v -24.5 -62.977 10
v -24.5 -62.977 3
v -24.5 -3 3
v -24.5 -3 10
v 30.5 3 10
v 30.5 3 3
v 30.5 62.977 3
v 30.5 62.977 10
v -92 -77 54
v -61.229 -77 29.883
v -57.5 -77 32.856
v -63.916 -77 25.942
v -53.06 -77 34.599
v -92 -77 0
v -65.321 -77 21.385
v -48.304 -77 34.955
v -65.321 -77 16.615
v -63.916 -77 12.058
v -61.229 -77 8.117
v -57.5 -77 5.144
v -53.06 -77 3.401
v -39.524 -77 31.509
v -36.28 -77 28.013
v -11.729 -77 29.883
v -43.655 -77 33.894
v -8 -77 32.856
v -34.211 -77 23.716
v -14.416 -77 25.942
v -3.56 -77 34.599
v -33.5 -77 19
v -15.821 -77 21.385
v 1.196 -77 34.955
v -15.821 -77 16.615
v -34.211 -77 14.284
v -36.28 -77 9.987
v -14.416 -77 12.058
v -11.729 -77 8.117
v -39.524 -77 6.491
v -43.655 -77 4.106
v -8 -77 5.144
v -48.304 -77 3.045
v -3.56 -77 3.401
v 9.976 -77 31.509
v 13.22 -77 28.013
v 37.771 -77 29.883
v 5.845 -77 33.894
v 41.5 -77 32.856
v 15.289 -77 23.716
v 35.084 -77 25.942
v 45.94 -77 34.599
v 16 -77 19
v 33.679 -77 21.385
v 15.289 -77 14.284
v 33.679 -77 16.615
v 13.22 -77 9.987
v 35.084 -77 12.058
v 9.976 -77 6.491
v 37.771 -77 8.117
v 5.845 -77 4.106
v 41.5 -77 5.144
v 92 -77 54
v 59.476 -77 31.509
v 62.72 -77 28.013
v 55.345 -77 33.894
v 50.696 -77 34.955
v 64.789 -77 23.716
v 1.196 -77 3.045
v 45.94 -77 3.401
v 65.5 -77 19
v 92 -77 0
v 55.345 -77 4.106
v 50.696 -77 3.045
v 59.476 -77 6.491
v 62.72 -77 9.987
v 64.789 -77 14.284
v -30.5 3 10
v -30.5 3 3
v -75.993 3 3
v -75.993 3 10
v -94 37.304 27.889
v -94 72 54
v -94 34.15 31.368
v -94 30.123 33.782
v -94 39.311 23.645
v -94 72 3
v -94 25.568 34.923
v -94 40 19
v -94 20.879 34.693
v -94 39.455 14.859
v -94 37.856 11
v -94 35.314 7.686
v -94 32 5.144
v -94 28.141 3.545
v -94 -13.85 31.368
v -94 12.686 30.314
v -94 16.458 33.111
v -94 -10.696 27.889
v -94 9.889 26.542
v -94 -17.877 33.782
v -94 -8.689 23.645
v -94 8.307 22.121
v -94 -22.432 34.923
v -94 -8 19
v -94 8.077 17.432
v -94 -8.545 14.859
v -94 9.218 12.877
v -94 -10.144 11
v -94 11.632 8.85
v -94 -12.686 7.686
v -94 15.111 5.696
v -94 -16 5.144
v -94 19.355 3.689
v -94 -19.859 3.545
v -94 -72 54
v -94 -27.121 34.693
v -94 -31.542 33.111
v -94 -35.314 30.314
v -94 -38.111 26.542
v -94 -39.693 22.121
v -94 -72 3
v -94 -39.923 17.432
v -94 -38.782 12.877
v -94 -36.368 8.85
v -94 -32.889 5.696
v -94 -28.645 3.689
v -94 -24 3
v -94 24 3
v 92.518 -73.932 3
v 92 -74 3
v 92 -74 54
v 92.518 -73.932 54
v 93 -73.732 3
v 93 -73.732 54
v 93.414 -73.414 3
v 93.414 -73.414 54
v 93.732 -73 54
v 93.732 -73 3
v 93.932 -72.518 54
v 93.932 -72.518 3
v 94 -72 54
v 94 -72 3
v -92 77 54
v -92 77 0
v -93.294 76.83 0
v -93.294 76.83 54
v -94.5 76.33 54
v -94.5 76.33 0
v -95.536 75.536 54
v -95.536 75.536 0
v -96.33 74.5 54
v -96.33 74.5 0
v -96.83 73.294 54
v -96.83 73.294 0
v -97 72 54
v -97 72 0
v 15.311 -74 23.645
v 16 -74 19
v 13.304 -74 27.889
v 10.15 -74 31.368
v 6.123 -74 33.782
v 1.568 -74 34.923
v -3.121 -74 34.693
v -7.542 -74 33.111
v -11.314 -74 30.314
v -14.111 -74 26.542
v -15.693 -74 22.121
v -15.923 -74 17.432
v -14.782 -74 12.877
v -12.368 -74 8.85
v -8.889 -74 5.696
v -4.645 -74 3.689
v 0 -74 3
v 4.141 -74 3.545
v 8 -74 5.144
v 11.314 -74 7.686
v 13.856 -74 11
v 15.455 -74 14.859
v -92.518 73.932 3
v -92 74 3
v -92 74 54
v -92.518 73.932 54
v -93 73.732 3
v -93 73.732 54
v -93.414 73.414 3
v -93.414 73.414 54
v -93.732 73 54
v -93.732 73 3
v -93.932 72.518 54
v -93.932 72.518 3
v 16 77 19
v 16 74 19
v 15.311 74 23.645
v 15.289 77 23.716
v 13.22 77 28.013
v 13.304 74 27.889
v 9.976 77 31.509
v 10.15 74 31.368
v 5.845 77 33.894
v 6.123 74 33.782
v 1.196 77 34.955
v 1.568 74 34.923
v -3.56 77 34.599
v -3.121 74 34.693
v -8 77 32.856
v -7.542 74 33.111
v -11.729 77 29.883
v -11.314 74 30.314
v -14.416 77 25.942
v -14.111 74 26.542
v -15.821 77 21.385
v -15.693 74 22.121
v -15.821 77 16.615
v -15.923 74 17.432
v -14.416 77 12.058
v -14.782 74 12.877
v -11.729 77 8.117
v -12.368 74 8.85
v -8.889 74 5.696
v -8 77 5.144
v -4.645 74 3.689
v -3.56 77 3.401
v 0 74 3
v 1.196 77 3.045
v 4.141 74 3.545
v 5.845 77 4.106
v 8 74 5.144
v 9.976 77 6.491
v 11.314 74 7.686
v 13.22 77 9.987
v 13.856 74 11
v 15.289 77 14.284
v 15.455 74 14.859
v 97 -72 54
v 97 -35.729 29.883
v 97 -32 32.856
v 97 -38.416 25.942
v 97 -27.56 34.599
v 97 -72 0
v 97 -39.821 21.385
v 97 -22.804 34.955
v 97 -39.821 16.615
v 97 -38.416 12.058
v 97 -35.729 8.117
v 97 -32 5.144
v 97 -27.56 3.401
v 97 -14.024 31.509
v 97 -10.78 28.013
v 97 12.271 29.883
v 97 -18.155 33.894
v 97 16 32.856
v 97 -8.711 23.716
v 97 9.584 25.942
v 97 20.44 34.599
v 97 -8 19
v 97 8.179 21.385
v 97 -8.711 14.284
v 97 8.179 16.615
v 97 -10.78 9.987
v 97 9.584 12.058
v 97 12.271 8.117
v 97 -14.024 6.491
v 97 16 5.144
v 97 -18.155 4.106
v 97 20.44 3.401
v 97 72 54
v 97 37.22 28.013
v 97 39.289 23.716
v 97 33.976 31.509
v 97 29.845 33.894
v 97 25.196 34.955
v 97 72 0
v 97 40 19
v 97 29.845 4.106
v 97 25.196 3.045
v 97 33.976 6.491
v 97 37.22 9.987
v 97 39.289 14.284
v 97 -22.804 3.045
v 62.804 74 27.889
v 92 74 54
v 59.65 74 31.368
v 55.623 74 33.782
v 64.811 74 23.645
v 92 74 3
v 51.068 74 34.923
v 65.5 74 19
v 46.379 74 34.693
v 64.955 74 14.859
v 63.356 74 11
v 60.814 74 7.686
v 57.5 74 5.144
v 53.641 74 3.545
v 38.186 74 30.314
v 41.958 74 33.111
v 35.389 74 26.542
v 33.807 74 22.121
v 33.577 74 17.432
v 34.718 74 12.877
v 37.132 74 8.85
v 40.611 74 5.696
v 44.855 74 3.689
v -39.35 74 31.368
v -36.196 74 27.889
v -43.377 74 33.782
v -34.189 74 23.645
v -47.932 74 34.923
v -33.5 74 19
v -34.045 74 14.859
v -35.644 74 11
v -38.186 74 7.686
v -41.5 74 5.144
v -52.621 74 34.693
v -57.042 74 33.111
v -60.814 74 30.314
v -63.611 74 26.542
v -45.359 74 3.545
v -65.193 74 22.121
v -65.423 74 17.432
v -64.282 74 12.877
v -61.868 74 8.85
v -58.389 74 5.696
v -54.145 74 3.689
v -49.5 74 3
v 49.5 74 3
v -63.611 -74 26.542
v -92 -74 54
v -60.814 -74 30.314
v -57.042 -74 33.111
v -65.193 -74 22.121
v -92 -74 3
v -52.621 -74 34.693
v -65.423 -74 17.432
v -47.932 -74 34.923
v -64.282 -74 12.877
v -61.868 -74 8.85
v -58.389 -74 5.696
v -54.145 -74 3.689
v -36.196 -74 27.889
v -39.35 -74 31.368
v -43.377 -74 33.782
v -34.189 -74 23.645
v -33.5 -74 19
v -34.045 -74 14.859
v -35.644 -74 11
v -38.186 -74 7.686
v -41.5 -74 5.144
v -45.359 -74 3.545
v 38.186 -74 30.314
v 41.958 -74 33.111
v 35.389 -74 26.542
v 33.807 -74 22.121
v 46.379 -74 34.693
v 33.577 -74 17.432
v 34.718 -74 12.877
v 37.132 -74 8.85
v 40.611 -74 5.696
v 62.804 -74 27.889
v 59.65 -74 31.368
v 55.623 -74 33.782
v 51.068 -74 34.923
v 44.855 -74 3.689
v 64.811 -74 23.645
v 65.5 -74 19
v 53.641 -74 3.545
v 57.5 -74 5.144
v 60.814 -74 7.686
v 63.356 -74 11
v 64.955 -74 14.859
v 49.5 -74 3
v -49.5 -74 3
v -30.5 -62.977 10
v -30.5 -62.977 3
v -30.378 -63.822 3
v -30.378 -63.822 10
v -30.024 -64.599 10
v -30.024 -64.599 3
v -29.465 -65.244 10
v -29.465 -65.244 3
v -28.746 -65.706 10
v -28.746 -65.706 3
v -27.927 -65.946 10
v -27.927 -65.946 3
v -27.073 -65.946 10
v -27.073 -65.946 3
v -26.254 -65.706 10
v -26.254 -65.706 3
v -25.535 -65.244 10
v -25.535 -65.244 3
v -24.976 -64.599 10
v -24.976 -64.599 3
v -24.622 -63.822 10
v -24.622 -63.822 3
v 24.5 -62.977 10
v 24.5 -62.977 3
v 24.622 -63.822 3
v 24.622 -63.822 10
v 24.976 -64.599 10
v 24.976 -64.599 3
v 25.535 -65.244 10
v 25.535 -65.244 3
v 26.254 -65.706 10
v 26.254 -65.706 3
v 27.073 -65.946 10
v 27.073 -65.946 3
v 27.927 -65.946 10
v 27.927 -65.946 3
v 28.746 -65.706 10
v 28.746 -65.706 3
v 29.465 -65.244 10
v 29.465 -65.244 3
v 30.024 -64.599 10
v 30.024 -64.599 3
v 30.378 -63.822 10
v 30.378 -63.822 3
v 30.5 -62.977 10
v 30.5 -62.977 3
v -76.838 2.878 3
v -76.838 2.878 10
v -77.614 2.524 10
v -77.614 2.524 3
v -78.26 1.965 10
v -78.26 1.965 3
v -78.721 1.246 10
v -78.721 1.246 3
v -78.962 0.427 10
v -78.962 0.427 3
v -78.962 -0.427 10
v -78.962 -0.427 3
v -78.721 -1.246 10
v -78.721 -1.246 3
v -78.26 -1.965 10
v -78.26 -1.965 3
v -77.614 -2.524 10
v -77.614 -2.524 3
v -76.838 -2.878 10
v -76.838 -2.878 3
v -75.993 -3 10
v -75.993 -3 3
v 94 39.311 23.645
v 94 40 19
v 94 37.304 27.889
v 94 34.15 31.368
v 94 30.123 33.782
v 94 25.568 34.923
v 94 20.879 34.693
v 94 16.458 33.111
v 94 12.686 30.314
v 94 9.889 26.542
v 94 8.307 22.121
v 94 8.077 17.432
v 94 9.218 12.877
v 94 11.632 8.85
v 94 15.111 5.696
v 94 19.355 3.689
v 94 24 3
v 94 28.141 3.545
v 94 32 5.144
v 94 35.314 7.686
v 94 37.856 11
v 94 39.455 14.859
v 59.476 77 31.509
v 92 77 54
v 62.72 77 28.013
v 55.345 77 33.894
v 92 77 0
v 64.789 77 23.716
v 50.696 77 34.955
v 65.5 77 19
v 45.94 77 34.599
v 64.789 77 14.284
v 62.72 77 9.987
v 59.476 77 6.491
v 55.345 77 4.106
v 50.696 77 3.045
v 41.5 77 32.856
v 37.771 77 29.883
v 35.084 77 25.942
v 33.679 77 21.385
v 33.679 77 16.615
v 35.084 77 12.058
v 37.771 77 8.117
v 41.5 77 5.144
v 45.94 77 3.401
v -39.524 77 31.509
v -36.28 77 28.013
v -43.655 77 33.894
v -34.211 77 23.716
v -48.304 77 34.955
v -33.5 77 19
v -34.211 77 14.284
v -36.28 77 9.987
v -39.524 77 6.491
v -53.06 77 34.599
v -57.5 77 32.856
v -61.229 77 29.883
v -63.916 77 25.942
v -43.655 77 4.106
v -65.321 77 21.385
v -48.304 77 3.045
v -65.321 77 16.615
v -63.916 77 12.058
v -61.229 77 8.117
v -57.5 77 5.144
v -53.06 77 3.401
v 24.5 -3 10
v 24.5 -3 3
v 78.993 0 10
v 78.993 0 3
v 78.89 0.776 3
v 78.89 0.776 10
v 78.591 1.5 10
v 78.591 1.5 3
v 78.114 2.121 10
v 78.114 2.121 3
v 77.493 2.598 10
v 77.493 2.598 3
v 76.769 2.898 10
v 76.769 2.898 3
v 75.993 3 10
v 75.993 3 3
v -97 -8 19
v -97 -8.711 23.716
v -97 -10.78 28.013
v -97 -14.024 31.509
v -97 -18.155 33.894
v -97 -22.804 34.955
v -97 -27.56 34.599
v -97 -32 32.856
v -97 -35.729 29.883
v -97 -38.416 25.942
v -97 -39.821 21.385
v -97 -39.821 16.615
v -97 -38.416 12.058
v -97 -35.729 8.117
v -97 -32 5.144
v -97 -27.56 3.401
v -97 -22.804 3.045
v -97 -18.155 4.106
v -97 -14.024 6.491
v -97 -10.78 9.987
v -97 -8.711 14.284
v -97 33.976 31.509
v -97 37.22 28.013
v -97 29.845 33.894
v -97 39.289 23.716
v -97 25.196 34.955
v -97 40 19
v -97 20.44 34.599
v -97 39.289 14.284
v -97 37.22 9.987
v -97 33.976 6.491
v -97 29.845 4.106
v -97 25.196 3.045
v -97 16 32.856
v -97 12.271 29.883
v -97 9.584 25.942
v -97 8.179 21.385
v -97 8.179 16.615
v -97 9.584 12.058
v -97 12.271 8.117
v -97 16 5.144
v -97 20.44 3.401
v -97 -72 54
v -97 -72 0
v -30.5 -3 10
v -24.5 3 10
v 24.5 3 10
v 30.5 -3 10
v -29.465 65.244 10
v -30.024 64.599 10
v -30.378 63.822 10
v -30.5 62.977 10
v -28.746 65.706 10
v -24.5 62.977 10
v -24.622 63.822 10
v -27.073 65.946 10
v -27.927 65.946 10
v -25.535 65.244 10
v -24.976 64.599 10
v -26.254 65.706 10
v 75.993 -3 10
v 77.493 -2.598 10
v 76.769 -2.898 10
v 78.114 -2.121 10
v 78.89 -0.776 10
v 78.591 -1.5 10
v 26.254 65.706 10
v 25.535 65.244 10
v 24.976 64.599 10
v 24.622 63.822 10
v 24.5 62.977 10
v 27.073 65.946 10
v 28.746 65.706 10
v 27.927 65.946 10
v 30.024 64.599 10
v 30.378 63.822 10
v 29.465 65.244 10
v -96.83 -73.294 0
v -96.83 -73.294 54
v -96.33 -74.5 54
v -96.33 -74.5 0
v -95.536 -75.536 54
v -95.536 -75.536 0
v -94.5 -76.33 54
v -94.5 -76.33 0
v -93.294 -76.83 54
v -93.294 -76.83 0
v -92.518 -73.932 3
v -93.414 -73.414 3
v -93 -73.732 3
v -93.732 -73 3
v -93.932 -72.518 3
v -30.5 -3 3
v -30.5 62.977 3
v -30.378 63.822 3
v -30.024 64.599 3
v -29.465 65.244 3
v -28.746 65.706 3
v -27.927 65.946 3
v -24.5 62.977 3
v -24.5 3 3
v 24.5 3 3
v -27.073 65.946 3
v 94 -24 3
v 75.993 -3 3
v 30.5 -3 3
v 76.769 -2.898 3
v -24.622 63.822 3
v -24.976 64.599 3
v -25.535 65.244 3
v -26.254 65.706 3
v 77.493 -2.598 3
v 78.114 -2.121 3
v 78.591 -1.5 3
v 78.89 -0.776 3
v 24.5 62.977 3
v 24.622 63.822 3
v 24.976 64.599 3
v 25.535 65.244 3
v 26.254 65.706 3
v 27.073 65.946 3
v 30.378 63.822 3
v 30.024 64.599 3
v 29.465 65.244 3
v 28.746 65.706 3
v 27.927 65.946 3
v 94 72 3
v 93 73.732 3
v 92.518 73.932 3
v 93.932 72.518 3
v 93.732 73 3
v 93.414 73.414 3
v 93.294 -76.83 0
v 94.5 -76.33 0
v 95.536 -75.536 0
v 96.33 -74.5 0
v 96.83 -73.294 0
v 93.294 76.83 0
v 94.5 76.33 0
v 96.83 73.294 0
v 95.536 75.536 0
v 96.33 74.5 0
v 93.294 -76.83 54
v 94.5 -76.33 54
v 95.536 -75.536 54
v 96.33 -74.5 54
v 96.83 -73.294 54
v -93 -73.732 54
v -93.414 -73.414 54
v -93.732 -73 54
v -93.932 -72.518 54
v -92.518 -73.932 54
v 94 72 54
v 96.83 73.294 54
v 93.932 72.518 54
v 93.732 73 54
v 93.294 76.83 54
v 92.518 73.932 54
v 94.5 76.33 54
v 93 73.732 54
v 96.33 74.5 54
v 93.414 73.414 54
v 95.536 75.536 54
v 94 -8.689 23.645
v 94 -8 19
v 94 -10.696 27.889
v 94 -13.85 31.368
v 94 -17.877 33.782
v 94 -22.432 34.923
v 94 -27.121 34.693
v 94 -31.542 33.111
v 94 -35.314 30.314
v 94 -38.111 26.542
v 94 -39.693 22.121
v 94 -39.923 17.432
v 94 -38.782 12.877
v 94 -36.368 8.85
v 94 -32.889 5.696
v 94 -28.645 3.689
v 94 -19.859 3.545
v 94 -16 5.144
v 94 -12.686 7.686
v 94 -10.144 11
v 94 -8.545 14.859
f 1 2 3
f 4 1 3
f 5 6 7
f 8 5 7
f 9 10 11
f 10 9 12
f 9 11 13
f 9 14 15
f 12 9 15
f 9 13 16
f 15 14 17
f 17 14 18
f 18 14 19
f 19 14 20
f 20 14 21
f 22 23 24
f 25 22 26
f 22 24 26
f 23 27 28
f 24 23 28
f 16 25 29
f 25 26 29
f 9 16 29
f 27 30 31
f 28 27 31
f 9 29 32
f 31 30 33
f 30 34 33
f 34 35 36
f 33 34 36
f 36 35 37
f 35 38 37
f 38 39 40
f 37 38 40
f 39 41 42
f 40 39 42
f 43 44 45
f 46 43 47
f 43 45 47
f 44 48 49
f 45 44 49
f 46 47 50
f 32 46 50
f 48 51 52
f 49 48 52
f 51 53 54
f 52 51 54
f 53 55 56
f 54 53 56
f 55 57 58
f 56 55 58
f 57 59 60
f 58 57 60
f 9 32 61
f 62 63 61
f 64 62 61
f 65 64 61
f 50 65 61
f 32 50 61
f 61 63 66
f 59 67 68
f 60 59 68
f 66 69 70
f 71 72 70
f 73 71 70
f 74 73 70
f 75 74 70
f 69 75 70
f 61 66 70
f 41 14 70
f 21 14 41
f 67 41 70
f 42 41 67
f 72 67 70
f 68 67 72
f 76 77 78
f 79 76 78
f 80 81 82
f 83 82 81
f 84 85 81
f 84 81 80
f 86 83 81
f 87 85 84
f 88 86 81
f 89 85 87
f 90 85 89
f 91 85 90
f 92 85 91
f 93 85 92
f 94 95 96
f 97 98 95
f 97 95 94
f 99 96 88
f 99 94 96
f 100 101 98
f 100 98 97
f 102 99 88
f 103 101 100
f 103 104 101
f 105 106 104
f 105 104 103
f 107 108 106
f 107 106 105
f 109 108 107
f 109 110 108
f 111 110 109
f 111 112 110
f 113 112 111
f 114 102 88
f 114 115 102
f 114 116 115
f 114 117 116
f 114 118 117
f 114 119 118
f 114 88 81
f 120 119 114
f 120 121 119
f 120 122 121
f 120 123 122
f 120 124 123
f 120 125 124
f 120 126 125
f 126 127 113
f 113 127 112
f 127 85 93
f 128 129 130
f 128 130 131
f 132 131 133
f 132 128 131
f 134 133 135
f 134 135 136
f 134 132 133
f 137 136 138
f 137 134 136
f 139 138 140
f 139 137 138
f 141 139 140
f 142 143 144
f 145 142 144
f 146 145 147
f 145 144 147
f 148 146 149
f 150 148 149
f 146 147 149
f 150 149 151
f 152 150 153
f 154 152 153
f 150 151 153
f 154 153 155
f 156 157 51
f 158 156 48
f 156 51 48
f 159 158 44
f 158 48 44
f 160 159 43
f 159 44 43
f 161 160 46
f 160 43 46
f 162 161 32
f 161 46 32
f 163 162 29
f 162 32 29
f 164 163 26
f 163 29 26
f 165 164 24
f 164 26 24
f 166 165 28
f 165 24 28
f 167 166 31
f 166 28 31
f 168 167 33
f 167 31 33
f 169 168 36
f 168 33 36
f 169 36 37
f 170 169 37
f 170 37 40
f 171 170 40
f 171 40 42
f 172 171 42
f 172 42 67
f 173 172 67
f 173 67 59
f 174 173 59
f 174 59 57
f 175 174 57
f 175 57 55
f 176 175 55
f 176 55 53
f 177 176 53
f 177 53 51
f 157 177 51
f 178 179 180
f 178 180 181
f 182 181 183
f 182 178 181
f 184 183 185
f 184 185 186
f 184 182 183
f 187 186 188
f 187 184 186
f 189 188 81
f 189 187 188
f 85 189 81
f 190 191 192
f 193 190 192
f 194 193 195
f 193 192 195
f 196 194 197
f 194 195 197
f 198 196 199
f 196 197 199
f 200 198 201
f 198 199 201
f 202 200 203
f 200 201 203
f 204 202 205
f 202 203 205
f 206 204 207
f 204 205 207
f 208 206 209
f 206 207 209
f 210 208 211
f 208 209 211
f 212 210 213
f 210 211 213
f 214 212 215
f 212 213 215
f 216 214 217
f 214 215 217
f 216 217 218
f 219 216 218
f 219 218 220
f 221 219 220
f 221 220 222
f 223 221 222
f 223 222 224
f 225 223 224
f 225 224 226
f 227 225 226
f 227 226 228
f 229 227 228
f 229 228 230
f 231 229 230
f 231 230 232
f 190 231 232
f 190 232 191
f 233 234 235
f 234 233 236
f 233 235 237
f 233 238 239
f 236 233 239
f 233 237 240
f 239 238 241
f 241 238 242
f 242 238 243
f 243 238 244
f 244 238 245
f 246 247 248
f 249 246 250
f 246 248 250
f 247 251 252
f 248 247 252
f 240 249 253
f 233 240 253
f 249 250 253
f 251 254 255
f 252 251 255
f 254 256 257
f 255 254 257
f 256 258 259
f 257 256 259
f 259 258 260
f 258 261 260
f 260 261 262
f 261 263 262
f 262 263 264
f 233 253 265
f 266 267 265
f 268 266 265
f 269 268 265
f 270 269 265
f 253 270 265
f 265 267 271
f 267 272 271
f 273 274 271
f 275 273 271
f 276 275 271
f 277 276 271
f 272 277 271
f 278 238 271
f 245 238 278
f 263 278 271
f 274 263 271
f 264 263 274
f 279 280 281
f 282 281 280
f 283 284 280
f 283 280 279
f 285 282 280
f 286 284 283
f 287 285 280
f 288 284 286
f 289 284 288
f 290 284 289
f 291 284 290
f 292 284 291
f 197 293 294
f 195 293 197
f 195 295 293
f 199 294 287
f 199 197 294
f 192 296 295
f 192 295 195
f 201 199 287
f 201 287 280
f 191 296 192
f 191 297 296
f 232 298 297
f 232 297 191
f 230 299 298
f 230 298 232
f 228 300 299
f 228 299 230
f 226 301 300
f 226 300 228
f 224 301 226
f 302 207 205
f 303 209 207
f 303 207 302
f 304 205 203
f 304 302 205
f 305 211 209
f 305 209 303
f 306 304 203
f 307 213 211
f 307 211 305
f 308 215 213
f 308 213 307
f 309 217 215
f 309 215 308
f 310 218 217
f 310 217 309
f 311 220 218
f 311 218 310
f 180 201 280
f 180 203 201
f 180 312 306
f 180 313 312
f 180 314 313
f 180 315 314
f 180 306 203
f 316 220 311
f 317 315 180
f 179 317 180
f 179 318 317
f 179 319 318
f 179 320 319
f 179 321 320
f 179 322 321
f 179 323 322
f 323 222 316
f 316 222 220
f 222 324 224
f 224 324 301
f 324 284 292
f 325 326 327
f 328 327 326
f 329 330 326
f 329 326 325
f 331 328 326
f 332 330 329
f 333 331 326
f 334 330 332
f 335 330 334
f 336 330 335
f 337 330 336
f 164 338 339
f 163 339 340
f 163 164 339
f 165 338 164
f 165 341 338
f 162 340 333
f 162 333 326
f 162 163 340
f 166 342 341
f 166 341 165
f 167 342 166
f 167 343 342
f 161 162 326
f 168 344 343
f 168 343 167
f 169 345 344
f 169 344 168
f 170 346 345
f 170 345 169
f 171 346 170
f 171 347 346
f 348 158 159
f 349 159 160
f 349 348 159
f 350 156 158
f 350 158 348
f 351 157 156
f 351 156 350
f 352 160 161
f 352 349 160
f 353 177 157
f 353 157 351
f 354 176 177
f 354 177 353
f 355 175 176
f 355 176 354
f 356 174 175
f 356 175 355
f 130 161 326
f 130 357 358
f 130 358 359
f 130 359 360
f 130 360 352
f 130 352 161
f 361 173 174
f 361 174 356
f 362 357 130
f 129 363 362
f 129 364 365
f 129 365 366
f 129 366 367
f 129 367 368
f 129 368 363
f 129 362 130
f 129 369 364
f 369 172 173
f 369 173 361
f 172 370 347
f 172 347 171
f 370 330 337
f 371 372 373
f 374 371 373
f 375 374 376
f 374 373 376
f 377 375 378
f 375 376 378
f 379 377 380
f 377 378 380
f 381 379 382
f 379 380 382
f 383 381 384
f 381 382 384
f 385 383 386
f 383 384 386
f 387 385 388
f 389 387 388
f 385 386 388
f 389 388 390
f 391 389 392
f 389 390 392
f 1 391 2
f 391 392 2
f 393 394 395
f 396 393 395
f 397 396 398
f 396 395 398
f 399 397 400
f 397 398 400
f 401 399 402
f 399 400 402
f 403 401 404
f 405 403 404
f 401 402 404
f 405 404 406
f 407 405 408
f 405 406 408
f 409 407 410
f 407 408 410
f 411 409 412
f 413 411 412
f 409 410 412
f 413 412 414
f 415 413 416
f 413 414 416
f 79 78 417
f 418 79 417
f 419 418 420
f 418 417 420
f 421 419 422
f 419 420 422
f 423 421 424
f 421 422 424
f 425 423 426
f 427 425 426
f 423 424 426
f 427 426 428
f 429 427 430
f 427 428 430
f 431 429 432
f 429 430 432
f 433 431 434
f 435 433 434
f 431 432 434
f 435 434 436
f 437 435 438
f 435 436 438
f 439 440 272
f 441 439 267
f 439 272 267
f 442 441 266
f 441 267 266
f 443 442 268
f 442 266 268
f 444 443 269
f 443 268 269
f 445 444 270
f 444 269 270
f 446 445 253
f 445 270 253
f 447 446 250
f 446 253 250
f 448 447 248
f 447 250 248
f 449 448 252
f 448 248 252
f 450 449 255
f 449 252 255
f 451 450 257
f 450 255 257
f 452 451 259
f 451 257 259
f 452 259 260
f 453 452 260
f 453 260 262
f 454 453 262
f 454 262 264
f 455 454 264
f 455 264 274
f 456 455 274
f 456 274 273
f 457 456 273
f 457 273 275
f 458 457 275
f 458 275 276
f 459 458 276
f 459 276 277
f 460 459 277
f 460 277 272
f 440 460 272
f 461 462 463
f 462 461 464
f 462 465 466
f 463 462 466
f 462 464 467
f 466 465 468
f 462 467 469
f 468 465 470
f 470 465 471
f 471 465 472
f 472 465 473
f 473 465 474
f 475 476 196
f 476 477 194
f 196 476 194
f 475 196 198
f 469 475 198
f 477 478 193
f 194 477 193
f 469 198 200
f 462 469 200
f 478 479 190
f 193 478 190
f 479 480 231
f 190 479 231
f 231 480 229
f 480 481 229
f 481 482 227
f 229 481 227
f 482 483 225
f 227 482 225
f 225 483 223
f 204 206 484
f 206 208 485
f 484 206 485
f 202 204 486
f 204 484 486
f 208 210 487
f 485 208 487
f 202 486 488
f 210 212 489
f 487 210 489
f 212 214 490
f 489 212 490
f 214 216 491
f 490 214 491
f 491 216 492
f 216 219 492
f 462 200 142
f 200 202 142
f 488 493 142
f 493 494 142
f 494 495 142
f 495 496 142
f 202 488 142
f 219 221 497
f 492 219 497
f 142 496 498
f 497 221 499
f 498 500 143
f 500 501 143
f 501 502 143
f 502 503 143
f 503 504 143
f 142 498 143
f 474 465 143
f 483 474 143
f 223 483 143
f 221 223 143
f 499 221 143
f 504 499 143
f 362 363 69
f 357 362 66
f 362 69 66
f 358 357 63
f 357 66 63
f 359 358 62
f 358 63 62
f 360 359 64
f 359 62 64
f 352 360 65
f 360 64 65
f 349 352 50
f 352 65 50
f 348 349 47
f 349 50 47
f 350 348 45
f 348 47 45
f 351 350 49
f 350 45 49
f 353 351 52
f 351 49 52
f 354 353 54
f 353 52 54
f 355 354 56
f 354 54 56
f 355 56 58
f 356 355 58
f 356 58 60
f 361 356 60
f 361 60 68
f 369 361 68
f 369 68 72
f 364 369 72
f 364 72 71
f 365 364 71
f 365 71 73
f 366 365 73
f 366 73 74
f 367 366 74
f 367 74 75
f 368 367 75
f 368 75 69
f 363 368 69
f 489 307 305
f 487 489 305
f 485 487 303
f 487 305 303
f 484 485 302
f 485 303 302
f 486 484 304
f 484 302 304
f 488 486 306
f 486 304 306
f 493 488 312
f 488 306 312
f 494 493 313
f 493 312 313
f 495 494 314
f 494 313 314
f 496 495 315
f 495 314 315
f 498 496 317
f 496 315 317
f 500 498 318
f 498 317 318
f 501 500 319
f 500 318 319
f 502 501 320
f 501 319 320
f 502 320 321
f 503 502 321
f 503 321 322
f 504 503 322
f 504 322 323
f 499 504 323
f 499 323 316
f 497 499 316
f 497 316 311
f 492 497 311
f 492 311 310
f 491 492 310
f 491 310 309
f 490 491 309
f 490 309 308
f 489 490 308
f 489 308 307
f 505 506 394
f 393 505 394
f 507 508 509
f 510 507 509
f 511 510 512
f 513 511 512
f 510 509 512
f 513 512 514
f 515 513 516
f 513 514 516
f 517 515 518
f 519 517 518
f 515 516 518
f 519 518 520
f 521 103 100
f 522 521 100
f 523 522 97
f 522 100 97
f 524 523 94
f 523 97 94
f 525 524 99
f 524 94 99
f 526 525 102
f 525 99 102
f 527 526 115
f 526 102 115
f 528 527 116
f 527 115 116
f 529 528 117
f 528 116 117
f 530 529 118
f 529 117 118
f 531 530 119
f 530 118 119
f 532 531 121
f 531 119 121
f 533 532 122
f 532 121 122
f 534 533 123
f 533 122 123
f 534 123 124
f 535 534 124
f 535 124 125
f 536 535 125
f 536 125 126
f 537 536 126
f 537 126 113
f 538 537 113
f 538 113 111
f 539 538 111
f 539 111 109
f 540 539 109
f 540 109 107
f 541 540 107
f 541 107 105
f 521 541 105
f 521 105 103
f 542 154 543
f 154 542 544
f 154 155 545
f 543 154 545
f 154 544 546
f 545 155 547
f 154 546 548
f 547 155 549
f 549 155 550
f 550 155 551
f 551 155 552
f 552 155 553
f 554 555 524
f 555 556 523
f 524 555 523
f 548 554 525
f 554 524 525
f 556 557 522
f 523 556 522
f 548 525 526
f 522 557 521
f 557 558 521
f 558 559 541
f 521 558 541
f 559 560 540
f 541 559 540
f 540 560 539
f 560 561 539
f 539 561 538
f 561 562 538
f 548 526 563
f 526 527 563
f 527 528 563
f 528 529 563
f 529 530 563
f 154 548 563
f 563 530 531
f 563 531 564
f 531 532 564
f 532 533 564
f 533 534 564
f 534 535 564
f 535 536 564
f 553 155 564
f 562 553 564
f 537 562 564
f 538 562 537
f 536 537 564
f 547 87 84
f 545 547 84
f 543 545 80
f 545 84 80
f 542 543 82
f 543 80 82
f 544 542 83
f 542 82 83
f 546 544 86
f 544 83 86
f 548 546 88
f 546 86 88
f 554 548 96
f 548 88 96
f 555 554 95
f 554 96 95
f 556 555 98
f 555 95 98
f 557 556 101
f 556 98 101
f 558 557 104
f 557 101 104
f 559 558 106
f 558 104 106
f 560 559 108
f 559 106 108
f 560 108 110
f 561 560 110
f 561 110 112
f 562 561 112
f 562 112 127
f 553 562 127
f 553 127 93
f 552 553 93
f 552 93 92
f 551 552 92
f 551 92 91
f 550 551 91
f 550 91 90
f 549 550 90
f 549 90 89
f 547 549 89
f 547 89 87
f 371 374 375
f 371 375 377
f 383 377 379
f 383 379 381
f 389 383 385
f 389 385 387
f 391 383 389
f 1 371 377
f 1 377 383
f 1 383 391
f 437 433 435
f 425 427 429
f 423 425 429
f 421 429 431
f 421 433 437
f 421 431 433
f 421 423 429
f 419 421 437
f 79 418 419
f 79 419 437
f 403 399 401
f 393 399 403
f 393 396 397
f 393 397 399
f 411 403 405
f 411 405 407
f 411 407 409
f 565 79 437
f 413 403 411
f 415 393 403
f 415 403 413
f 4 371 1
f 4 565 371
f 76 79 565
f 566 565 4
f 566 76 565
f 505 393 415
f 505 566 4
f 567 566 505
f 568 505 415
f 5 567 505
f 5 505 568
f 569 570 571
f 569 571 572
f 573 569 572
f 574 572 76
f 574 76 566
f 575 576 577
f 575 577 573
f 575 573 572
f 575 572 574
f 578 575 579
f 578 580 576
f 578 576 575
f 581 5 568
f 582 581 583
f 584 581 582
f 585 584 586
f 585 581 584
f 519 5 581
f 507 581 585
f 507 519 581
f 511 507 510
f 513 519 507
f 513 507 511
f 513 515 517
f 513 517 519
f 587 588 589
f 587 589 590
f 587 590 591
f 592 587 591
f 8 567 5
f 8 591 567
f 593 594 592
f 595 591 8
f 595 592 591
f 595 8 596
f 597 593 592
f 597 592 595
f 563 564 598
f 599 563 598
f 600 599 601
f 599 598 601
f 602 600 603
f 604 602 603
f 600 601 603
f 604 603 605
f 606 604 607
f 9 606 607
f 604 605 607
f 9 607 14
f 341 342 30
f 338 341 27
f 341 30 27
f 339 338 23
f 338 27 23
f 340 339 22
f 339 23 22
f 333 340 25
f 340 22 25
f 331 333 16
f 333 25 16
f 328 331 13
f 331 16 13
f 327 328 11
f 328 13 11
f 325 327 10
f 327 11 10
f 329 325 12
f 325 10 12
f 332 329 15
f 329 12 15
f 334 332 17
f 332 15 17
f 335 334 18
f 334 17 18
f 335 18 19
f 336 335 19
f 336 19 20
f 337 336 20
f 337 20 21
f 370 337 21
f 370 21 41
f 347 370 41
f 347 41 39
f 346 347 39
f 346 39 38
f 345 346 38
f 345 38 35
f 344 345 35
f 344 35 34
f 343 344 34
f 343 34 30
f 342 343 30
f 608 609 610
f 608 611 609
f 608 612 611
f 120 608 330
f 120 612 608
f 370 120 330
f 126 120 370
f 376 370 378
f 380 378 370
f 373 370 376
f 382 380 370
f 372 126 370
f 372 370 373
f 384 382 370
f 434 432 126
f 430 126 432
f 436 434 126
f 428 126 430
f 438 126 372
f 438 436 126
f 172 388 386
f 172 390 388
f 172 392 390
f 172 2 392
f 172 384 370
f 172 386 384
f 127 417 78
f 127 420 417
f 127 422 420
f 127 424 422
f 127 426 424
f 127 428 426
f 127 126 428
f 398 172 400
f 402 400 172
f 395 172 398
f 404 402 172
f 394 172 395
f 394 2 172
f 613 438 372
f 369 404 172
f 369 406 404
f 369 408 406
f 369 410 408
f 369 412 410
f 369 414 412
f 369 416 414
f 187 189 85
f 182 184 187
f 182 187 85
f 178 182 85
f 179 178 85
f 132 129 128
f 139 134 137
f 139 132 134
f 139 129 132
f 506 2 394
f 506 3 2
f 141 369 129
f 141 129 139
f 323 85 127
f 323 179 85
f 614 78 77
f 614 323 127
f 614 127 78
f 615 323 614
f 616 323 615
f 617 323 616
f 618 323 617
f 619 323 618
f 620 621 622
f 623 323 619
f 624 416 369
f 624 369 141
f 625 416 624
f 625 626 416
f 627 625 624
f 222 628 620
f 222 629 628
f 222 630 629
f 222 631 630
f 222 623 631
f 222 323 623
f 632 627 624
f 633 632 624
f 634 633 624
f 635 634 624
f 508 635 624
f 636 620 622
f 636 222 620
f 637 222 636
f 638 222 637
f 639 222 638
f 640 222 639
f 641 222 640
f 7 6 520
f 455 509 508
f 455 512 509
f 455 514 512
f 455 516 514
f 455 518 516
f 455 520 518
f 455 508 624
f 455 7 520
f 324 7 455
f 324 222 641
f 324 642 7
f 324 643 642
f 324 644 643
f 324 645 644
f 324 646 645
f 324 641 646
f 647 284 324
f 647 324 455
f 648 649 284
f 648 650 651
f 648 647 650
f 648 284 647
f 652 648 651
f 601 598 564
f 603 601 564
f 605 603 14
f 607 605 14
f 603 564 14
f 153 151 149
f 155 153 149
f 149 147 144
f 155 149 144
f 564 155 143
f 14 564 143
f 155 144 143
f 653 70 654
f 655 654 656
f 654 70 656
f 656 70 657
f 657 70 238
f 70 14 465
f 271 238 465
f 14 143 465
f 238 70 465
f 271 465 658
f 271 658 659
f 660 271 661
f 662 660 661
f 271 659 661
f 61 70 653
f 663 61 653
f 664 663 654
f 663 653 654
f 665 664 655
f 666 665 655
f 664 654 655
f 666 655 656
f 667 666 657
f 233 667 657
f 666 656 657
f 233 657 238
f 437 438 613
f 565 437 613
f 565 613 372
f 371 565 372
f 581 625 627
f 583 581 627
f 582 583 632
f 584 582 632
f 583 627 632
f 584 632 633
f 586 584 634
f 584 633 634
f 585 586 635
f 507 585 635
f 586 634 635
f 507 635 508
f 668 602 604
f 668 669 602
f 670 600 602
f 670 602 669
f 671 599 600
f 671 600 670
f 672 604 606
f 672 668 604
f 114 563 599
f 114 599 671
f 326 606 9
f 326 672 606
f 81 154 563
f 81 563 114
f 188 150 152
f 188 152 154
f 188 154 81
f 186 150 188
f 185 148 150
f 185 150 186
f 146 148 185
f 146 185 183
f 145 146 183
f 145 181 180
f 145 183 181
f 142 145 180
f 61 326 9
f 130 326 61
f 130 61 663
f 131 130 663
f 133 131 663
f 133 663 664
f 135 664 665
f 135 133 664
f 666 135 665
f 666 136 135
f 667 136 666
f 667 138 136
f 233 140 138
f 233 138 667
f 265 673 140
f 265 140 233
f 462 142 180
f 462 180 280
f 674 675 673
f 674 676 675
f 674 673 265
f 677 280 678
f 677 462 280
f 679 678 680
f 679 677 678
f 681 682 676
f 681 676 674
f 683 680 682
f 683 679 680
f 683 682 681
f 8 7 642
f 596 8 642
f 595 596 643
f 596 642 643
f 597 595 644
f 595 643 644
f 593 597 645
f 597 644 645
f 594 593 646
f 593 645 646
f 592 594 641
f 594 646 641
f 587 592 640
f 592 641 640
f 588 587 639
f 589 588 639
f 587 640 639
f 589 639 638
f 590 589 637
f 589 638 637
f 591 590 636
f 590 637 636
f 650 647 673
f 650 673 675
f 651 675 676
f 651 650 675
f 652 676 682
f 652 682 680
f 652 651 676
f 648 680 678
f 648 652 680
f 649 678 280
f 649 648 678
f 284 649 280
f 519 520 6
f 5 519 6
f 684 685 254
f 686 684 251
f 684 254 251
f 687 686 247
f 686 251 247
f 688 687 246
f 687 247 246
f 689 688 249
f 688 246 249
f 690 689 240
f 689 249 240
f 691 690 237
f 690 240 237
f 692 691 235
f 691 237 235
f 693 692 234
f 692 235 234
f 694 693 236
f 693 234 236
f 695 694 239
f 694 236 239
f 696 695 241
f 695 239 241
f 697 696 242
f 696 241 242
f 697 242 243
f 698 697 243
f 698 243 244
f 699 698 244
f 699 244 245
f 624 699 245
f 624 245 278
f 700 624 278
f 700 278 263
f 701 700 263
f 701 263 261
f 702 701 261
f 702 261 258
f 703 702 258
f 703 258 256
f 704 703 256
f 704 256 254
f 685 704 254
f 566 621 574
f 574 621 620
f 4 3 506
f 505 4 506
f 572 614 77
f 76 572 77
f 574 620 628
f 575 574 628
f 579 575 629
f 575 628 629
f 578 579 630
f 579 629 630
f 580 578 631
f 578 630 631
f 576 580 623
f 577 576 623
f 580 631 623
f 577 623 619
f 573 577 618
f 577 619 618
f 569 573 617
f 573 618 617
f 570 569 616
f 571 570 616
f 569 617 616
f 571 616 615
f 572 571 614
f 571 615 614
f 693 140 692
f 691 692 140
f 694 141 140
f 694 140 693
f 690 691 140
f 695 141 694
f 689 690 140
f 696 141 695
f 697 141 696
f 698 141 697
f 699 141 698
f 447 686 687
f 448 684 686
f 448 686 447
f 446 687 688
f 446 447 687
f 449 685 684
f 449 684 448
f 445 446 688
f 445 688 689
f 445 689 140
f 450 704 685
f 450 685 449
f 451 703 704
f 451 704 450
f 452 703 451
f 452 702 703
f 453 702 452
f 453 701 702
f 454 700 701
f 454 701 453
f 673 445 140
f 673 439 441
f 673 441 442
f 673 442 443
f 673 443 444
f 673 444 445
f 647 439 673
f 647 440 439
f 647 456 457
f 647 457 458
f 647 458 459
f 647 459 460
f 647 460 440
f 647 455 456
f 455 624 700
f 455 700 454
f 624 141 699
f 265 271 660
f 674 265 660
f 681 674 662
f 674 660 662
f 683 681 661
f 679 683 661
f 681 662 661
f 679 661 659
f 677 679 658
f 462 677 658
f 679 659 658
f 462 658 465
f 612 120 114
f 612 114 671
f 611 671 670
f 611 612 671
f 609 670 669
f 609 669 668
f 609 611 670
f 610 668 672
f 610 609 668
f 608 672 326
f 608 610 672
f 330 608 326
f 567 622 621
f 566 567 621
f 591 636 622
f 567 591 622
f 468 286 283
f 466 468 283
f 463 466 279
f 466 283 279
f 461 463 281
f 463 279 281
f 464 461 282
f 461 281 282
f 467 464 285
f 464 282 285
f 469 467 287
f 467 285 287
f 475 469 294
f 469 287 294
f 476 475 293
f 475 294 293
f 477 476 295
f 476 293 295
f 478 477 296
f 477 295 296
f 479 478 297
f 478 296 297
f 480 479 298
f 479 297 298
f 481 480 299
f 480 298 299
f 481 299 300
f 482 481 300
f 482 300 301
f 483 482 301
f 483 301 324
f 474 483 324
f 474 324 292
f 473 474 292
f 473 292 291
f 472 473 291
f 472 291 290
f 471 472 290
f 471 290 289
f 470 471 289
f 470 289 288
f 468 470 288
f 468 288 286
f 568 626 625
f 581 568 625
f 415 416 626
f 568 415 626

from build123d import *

# Parameters (mm, degrees)
F1_DEPTH = 54
F2_T     = -3
F3_R     = 16
F4_DEPTH = 154.001
F5_R     = 16
F6_DEPTH = 194.001
F7_W     = 6
F7_H     = 6
F7_W_2   = 49
F8_DEPTH = 7


with BuildPart() as f1:
    # F0 (on Top) → F1 (new body)
    with BuildSketch(Plane.XY):
        with BuildLine():
            ThreePointArc((97, 72), (95.5355339059, 75.5355339059), (92, 77))
            Line((92, 77), (-92, 77))
            ThreePointArc((-92, 77), (-95.5355339059, 75.5355339059), (-97, 72))
            Line((-97, 72), (-97, -72))
            ThreePointArc((-97, -72), (-95.5355339059, -75.5355339059), (-92, -77))
            Line((-92, -77), (92, -77))
            ThreePointArc((92, -77), (95.5355339059, -75.5355339059), (97, -72))
            Line((97, -72), (97, 72))
        make_face()
    extrude(amount=F1_DEPTH)

    # F2
    f2_openings = [f1.faces().sort_by_distance(p)[0] for p in [
        (0, 0, 54),
    ]]
    offset(amount=F2_T, openings=f2_openings)

    # F3 (on face) → F4 (cut, through all)
    with BuildSketch(Plane.XZ.offset(77)):
        with Locations((-49.5, 19)):
            Circle(F3_R)
        with Locations((0, 19)):
            Circle(F3_R)
        with Locations((49.5, 19)):
            Circle(F3_R)
    extrude(amount=-F4_DEPTH, mode=Mode.SUBTRACT)

    # F5 (on face) → F6 (cut, through all)
    with BuildSketch(Plane.YZ.offset(97)):
        with Locations((-24, 19)):
            Circle(F5_R)
        with Locations((24, 19)):
            Circle(F5_R)
    extrude(amount=-F6_DEPTH, mode=Mode.SUBTRACT)

    # F7 (on face) → F8 (join)
    with BuildSketch(Plane.XY.offset(3)):
        with BuildLine():
            ThreePointArc((-30.5, 62.9770308733), (-27.5, 59.9770308733), (-24.5, 62.9770308733))
            ThreePointArc((-24.5, 62.9770308733), (-27.5, 65.9770308733), (-30.5, 62.9770308733))
        make_face()
        with BuildLine():
            Line((-24.5, 3), (-24.5, 62.9770308733))
            ThreePointArc((-24.5, 62.9770308733), (-27.5, 59.9770308733), (-30.5, 62.9770308733))
            Line((-30.5, 62.9770308733), (-30.5, 3))
            Line((-30.5, 3), (-24.5, 3))
        make_face()
        with Locations((-27.5, 0)):
            Rectangle(F7_W, F7_H)
        Rectangle(F7_W_2, F7_H)
        with BuildLine():
            Line((-30.5, -3), (-30.5, 3))
            Line((-30.5, 3), (-75.992539525, 3))
            ThreePointArc((-75.992539525, 3), (-73.8712191815, 2.1213203436), (-72.992539525, 0))
            ThreePointArc((-72.992539525, 0), (-73.8712191815, -2.1213203436), (-75.992539525, -3))
            Line((-75.992539525, -3), (-30.5, -3))
        make_face()
        with Locations((27.5, 0)):
            Rectangle(F7_W, F7_H)
        with BuildLine():
            Line((24.5, 62.9770308733), (24.5, 3))
            Line((24.5, 3), (30.5, 3))
            Line((30.5, 3), (30.5, 62.9770308733))
            ThreePointArc((30.5, 62.9770308733), (27.5, 59.9770308733), (24.5, 62.9770308733))
        make_face()
        with BuildLine():
            Line((-24.5, -62.9770308733), (-24.5, -3))
            Line((-24.5, -3), (-30.5, -3))
            Line((-30.5, -3), (-30.5, -62.9770308733))
            ThreePointArc((-30.5, -62.9770308733), (-27.5, -59.9770308733), (-24.5, -62.9770308733))
        make_face()
        with BuildLine():
            ThreePointArc((-72.992539525, 0), (-73.8712191815, 2.1213203436), (-75.992539525, 3))
            ThreePointArc((-75.992539525, 3), (-78.992539525, 0), (-75.992539525, -3))
            ThreePointArc((-75.992539525, -3), (-73.8712191815, -2.1213203436), (-72.992539525, 0))
        make_face()
        with BuildLine():
            Line((30.5, -3), (24.5, -3))
            Line((24.5, -3), (24.5, -62.9770308733))
            ThreePointArc((24.5, -62.9770308733), (27.5, -59.9770308733), (30.5, -62.9770308733))
            Line((30.5, -62.9770308733), (30.5, -3))
        make_face()
        with BuildLine():
            ThreePointArc((30.5, 62.9770308733), (27.5, 65.9770308733), (24.5, 62.9770308733))
            ThreePointArc((24.5, 62.9770308733), (27.5, 59.9770308733), (30.5, 62.9770308733))
        make_face()
        with BuildLine():
            Line((75.992539525, 3), (30.5, 3))
            Line((30.5, 3), (30.5, -3))
            Line((30.5, -3), (75.992539525, -3))
            ThreePointArc((75.992539525, -3), (72.992539525, 0), (75.992539525, 3))
        make_face()
        with BuildLine():
            ThreePointArc((-30.5, -62.9770308733), (-27.5, -65.9770308733), (-24.5, -62.9770308733))
            ThreePointArc((-24.5, -62.9770308733), (-27.5, -59.9770308733), (-30.5, -62.9770308733))
        make_face()
        with BuildLine():
            ThreePointArc((30.5, -62.9770308733), (27.5, -59.9770308733), (24.5, -62.9770308733))
            ThreePointArc((24.5, -62.9770308733), (27.5, -65.9770308733), (30.5, -62.9770308733))
        make_face()
        with BuildLine():
            ThreePointArc((78.992539525, 0), (78.1138598686, 2.1213203436), (75.992539525, 3))
            ThreePointArc((75.992539525, 3), (72.992539525, 0), (75.992539525, -3))
            ThreePointArc((75.992539525, -3), (78.1138598686, -2.1213203436), (78.992539525, 0))
        make_face()
    extrude(amount=F8_DEPTH)


solid = f1.part
